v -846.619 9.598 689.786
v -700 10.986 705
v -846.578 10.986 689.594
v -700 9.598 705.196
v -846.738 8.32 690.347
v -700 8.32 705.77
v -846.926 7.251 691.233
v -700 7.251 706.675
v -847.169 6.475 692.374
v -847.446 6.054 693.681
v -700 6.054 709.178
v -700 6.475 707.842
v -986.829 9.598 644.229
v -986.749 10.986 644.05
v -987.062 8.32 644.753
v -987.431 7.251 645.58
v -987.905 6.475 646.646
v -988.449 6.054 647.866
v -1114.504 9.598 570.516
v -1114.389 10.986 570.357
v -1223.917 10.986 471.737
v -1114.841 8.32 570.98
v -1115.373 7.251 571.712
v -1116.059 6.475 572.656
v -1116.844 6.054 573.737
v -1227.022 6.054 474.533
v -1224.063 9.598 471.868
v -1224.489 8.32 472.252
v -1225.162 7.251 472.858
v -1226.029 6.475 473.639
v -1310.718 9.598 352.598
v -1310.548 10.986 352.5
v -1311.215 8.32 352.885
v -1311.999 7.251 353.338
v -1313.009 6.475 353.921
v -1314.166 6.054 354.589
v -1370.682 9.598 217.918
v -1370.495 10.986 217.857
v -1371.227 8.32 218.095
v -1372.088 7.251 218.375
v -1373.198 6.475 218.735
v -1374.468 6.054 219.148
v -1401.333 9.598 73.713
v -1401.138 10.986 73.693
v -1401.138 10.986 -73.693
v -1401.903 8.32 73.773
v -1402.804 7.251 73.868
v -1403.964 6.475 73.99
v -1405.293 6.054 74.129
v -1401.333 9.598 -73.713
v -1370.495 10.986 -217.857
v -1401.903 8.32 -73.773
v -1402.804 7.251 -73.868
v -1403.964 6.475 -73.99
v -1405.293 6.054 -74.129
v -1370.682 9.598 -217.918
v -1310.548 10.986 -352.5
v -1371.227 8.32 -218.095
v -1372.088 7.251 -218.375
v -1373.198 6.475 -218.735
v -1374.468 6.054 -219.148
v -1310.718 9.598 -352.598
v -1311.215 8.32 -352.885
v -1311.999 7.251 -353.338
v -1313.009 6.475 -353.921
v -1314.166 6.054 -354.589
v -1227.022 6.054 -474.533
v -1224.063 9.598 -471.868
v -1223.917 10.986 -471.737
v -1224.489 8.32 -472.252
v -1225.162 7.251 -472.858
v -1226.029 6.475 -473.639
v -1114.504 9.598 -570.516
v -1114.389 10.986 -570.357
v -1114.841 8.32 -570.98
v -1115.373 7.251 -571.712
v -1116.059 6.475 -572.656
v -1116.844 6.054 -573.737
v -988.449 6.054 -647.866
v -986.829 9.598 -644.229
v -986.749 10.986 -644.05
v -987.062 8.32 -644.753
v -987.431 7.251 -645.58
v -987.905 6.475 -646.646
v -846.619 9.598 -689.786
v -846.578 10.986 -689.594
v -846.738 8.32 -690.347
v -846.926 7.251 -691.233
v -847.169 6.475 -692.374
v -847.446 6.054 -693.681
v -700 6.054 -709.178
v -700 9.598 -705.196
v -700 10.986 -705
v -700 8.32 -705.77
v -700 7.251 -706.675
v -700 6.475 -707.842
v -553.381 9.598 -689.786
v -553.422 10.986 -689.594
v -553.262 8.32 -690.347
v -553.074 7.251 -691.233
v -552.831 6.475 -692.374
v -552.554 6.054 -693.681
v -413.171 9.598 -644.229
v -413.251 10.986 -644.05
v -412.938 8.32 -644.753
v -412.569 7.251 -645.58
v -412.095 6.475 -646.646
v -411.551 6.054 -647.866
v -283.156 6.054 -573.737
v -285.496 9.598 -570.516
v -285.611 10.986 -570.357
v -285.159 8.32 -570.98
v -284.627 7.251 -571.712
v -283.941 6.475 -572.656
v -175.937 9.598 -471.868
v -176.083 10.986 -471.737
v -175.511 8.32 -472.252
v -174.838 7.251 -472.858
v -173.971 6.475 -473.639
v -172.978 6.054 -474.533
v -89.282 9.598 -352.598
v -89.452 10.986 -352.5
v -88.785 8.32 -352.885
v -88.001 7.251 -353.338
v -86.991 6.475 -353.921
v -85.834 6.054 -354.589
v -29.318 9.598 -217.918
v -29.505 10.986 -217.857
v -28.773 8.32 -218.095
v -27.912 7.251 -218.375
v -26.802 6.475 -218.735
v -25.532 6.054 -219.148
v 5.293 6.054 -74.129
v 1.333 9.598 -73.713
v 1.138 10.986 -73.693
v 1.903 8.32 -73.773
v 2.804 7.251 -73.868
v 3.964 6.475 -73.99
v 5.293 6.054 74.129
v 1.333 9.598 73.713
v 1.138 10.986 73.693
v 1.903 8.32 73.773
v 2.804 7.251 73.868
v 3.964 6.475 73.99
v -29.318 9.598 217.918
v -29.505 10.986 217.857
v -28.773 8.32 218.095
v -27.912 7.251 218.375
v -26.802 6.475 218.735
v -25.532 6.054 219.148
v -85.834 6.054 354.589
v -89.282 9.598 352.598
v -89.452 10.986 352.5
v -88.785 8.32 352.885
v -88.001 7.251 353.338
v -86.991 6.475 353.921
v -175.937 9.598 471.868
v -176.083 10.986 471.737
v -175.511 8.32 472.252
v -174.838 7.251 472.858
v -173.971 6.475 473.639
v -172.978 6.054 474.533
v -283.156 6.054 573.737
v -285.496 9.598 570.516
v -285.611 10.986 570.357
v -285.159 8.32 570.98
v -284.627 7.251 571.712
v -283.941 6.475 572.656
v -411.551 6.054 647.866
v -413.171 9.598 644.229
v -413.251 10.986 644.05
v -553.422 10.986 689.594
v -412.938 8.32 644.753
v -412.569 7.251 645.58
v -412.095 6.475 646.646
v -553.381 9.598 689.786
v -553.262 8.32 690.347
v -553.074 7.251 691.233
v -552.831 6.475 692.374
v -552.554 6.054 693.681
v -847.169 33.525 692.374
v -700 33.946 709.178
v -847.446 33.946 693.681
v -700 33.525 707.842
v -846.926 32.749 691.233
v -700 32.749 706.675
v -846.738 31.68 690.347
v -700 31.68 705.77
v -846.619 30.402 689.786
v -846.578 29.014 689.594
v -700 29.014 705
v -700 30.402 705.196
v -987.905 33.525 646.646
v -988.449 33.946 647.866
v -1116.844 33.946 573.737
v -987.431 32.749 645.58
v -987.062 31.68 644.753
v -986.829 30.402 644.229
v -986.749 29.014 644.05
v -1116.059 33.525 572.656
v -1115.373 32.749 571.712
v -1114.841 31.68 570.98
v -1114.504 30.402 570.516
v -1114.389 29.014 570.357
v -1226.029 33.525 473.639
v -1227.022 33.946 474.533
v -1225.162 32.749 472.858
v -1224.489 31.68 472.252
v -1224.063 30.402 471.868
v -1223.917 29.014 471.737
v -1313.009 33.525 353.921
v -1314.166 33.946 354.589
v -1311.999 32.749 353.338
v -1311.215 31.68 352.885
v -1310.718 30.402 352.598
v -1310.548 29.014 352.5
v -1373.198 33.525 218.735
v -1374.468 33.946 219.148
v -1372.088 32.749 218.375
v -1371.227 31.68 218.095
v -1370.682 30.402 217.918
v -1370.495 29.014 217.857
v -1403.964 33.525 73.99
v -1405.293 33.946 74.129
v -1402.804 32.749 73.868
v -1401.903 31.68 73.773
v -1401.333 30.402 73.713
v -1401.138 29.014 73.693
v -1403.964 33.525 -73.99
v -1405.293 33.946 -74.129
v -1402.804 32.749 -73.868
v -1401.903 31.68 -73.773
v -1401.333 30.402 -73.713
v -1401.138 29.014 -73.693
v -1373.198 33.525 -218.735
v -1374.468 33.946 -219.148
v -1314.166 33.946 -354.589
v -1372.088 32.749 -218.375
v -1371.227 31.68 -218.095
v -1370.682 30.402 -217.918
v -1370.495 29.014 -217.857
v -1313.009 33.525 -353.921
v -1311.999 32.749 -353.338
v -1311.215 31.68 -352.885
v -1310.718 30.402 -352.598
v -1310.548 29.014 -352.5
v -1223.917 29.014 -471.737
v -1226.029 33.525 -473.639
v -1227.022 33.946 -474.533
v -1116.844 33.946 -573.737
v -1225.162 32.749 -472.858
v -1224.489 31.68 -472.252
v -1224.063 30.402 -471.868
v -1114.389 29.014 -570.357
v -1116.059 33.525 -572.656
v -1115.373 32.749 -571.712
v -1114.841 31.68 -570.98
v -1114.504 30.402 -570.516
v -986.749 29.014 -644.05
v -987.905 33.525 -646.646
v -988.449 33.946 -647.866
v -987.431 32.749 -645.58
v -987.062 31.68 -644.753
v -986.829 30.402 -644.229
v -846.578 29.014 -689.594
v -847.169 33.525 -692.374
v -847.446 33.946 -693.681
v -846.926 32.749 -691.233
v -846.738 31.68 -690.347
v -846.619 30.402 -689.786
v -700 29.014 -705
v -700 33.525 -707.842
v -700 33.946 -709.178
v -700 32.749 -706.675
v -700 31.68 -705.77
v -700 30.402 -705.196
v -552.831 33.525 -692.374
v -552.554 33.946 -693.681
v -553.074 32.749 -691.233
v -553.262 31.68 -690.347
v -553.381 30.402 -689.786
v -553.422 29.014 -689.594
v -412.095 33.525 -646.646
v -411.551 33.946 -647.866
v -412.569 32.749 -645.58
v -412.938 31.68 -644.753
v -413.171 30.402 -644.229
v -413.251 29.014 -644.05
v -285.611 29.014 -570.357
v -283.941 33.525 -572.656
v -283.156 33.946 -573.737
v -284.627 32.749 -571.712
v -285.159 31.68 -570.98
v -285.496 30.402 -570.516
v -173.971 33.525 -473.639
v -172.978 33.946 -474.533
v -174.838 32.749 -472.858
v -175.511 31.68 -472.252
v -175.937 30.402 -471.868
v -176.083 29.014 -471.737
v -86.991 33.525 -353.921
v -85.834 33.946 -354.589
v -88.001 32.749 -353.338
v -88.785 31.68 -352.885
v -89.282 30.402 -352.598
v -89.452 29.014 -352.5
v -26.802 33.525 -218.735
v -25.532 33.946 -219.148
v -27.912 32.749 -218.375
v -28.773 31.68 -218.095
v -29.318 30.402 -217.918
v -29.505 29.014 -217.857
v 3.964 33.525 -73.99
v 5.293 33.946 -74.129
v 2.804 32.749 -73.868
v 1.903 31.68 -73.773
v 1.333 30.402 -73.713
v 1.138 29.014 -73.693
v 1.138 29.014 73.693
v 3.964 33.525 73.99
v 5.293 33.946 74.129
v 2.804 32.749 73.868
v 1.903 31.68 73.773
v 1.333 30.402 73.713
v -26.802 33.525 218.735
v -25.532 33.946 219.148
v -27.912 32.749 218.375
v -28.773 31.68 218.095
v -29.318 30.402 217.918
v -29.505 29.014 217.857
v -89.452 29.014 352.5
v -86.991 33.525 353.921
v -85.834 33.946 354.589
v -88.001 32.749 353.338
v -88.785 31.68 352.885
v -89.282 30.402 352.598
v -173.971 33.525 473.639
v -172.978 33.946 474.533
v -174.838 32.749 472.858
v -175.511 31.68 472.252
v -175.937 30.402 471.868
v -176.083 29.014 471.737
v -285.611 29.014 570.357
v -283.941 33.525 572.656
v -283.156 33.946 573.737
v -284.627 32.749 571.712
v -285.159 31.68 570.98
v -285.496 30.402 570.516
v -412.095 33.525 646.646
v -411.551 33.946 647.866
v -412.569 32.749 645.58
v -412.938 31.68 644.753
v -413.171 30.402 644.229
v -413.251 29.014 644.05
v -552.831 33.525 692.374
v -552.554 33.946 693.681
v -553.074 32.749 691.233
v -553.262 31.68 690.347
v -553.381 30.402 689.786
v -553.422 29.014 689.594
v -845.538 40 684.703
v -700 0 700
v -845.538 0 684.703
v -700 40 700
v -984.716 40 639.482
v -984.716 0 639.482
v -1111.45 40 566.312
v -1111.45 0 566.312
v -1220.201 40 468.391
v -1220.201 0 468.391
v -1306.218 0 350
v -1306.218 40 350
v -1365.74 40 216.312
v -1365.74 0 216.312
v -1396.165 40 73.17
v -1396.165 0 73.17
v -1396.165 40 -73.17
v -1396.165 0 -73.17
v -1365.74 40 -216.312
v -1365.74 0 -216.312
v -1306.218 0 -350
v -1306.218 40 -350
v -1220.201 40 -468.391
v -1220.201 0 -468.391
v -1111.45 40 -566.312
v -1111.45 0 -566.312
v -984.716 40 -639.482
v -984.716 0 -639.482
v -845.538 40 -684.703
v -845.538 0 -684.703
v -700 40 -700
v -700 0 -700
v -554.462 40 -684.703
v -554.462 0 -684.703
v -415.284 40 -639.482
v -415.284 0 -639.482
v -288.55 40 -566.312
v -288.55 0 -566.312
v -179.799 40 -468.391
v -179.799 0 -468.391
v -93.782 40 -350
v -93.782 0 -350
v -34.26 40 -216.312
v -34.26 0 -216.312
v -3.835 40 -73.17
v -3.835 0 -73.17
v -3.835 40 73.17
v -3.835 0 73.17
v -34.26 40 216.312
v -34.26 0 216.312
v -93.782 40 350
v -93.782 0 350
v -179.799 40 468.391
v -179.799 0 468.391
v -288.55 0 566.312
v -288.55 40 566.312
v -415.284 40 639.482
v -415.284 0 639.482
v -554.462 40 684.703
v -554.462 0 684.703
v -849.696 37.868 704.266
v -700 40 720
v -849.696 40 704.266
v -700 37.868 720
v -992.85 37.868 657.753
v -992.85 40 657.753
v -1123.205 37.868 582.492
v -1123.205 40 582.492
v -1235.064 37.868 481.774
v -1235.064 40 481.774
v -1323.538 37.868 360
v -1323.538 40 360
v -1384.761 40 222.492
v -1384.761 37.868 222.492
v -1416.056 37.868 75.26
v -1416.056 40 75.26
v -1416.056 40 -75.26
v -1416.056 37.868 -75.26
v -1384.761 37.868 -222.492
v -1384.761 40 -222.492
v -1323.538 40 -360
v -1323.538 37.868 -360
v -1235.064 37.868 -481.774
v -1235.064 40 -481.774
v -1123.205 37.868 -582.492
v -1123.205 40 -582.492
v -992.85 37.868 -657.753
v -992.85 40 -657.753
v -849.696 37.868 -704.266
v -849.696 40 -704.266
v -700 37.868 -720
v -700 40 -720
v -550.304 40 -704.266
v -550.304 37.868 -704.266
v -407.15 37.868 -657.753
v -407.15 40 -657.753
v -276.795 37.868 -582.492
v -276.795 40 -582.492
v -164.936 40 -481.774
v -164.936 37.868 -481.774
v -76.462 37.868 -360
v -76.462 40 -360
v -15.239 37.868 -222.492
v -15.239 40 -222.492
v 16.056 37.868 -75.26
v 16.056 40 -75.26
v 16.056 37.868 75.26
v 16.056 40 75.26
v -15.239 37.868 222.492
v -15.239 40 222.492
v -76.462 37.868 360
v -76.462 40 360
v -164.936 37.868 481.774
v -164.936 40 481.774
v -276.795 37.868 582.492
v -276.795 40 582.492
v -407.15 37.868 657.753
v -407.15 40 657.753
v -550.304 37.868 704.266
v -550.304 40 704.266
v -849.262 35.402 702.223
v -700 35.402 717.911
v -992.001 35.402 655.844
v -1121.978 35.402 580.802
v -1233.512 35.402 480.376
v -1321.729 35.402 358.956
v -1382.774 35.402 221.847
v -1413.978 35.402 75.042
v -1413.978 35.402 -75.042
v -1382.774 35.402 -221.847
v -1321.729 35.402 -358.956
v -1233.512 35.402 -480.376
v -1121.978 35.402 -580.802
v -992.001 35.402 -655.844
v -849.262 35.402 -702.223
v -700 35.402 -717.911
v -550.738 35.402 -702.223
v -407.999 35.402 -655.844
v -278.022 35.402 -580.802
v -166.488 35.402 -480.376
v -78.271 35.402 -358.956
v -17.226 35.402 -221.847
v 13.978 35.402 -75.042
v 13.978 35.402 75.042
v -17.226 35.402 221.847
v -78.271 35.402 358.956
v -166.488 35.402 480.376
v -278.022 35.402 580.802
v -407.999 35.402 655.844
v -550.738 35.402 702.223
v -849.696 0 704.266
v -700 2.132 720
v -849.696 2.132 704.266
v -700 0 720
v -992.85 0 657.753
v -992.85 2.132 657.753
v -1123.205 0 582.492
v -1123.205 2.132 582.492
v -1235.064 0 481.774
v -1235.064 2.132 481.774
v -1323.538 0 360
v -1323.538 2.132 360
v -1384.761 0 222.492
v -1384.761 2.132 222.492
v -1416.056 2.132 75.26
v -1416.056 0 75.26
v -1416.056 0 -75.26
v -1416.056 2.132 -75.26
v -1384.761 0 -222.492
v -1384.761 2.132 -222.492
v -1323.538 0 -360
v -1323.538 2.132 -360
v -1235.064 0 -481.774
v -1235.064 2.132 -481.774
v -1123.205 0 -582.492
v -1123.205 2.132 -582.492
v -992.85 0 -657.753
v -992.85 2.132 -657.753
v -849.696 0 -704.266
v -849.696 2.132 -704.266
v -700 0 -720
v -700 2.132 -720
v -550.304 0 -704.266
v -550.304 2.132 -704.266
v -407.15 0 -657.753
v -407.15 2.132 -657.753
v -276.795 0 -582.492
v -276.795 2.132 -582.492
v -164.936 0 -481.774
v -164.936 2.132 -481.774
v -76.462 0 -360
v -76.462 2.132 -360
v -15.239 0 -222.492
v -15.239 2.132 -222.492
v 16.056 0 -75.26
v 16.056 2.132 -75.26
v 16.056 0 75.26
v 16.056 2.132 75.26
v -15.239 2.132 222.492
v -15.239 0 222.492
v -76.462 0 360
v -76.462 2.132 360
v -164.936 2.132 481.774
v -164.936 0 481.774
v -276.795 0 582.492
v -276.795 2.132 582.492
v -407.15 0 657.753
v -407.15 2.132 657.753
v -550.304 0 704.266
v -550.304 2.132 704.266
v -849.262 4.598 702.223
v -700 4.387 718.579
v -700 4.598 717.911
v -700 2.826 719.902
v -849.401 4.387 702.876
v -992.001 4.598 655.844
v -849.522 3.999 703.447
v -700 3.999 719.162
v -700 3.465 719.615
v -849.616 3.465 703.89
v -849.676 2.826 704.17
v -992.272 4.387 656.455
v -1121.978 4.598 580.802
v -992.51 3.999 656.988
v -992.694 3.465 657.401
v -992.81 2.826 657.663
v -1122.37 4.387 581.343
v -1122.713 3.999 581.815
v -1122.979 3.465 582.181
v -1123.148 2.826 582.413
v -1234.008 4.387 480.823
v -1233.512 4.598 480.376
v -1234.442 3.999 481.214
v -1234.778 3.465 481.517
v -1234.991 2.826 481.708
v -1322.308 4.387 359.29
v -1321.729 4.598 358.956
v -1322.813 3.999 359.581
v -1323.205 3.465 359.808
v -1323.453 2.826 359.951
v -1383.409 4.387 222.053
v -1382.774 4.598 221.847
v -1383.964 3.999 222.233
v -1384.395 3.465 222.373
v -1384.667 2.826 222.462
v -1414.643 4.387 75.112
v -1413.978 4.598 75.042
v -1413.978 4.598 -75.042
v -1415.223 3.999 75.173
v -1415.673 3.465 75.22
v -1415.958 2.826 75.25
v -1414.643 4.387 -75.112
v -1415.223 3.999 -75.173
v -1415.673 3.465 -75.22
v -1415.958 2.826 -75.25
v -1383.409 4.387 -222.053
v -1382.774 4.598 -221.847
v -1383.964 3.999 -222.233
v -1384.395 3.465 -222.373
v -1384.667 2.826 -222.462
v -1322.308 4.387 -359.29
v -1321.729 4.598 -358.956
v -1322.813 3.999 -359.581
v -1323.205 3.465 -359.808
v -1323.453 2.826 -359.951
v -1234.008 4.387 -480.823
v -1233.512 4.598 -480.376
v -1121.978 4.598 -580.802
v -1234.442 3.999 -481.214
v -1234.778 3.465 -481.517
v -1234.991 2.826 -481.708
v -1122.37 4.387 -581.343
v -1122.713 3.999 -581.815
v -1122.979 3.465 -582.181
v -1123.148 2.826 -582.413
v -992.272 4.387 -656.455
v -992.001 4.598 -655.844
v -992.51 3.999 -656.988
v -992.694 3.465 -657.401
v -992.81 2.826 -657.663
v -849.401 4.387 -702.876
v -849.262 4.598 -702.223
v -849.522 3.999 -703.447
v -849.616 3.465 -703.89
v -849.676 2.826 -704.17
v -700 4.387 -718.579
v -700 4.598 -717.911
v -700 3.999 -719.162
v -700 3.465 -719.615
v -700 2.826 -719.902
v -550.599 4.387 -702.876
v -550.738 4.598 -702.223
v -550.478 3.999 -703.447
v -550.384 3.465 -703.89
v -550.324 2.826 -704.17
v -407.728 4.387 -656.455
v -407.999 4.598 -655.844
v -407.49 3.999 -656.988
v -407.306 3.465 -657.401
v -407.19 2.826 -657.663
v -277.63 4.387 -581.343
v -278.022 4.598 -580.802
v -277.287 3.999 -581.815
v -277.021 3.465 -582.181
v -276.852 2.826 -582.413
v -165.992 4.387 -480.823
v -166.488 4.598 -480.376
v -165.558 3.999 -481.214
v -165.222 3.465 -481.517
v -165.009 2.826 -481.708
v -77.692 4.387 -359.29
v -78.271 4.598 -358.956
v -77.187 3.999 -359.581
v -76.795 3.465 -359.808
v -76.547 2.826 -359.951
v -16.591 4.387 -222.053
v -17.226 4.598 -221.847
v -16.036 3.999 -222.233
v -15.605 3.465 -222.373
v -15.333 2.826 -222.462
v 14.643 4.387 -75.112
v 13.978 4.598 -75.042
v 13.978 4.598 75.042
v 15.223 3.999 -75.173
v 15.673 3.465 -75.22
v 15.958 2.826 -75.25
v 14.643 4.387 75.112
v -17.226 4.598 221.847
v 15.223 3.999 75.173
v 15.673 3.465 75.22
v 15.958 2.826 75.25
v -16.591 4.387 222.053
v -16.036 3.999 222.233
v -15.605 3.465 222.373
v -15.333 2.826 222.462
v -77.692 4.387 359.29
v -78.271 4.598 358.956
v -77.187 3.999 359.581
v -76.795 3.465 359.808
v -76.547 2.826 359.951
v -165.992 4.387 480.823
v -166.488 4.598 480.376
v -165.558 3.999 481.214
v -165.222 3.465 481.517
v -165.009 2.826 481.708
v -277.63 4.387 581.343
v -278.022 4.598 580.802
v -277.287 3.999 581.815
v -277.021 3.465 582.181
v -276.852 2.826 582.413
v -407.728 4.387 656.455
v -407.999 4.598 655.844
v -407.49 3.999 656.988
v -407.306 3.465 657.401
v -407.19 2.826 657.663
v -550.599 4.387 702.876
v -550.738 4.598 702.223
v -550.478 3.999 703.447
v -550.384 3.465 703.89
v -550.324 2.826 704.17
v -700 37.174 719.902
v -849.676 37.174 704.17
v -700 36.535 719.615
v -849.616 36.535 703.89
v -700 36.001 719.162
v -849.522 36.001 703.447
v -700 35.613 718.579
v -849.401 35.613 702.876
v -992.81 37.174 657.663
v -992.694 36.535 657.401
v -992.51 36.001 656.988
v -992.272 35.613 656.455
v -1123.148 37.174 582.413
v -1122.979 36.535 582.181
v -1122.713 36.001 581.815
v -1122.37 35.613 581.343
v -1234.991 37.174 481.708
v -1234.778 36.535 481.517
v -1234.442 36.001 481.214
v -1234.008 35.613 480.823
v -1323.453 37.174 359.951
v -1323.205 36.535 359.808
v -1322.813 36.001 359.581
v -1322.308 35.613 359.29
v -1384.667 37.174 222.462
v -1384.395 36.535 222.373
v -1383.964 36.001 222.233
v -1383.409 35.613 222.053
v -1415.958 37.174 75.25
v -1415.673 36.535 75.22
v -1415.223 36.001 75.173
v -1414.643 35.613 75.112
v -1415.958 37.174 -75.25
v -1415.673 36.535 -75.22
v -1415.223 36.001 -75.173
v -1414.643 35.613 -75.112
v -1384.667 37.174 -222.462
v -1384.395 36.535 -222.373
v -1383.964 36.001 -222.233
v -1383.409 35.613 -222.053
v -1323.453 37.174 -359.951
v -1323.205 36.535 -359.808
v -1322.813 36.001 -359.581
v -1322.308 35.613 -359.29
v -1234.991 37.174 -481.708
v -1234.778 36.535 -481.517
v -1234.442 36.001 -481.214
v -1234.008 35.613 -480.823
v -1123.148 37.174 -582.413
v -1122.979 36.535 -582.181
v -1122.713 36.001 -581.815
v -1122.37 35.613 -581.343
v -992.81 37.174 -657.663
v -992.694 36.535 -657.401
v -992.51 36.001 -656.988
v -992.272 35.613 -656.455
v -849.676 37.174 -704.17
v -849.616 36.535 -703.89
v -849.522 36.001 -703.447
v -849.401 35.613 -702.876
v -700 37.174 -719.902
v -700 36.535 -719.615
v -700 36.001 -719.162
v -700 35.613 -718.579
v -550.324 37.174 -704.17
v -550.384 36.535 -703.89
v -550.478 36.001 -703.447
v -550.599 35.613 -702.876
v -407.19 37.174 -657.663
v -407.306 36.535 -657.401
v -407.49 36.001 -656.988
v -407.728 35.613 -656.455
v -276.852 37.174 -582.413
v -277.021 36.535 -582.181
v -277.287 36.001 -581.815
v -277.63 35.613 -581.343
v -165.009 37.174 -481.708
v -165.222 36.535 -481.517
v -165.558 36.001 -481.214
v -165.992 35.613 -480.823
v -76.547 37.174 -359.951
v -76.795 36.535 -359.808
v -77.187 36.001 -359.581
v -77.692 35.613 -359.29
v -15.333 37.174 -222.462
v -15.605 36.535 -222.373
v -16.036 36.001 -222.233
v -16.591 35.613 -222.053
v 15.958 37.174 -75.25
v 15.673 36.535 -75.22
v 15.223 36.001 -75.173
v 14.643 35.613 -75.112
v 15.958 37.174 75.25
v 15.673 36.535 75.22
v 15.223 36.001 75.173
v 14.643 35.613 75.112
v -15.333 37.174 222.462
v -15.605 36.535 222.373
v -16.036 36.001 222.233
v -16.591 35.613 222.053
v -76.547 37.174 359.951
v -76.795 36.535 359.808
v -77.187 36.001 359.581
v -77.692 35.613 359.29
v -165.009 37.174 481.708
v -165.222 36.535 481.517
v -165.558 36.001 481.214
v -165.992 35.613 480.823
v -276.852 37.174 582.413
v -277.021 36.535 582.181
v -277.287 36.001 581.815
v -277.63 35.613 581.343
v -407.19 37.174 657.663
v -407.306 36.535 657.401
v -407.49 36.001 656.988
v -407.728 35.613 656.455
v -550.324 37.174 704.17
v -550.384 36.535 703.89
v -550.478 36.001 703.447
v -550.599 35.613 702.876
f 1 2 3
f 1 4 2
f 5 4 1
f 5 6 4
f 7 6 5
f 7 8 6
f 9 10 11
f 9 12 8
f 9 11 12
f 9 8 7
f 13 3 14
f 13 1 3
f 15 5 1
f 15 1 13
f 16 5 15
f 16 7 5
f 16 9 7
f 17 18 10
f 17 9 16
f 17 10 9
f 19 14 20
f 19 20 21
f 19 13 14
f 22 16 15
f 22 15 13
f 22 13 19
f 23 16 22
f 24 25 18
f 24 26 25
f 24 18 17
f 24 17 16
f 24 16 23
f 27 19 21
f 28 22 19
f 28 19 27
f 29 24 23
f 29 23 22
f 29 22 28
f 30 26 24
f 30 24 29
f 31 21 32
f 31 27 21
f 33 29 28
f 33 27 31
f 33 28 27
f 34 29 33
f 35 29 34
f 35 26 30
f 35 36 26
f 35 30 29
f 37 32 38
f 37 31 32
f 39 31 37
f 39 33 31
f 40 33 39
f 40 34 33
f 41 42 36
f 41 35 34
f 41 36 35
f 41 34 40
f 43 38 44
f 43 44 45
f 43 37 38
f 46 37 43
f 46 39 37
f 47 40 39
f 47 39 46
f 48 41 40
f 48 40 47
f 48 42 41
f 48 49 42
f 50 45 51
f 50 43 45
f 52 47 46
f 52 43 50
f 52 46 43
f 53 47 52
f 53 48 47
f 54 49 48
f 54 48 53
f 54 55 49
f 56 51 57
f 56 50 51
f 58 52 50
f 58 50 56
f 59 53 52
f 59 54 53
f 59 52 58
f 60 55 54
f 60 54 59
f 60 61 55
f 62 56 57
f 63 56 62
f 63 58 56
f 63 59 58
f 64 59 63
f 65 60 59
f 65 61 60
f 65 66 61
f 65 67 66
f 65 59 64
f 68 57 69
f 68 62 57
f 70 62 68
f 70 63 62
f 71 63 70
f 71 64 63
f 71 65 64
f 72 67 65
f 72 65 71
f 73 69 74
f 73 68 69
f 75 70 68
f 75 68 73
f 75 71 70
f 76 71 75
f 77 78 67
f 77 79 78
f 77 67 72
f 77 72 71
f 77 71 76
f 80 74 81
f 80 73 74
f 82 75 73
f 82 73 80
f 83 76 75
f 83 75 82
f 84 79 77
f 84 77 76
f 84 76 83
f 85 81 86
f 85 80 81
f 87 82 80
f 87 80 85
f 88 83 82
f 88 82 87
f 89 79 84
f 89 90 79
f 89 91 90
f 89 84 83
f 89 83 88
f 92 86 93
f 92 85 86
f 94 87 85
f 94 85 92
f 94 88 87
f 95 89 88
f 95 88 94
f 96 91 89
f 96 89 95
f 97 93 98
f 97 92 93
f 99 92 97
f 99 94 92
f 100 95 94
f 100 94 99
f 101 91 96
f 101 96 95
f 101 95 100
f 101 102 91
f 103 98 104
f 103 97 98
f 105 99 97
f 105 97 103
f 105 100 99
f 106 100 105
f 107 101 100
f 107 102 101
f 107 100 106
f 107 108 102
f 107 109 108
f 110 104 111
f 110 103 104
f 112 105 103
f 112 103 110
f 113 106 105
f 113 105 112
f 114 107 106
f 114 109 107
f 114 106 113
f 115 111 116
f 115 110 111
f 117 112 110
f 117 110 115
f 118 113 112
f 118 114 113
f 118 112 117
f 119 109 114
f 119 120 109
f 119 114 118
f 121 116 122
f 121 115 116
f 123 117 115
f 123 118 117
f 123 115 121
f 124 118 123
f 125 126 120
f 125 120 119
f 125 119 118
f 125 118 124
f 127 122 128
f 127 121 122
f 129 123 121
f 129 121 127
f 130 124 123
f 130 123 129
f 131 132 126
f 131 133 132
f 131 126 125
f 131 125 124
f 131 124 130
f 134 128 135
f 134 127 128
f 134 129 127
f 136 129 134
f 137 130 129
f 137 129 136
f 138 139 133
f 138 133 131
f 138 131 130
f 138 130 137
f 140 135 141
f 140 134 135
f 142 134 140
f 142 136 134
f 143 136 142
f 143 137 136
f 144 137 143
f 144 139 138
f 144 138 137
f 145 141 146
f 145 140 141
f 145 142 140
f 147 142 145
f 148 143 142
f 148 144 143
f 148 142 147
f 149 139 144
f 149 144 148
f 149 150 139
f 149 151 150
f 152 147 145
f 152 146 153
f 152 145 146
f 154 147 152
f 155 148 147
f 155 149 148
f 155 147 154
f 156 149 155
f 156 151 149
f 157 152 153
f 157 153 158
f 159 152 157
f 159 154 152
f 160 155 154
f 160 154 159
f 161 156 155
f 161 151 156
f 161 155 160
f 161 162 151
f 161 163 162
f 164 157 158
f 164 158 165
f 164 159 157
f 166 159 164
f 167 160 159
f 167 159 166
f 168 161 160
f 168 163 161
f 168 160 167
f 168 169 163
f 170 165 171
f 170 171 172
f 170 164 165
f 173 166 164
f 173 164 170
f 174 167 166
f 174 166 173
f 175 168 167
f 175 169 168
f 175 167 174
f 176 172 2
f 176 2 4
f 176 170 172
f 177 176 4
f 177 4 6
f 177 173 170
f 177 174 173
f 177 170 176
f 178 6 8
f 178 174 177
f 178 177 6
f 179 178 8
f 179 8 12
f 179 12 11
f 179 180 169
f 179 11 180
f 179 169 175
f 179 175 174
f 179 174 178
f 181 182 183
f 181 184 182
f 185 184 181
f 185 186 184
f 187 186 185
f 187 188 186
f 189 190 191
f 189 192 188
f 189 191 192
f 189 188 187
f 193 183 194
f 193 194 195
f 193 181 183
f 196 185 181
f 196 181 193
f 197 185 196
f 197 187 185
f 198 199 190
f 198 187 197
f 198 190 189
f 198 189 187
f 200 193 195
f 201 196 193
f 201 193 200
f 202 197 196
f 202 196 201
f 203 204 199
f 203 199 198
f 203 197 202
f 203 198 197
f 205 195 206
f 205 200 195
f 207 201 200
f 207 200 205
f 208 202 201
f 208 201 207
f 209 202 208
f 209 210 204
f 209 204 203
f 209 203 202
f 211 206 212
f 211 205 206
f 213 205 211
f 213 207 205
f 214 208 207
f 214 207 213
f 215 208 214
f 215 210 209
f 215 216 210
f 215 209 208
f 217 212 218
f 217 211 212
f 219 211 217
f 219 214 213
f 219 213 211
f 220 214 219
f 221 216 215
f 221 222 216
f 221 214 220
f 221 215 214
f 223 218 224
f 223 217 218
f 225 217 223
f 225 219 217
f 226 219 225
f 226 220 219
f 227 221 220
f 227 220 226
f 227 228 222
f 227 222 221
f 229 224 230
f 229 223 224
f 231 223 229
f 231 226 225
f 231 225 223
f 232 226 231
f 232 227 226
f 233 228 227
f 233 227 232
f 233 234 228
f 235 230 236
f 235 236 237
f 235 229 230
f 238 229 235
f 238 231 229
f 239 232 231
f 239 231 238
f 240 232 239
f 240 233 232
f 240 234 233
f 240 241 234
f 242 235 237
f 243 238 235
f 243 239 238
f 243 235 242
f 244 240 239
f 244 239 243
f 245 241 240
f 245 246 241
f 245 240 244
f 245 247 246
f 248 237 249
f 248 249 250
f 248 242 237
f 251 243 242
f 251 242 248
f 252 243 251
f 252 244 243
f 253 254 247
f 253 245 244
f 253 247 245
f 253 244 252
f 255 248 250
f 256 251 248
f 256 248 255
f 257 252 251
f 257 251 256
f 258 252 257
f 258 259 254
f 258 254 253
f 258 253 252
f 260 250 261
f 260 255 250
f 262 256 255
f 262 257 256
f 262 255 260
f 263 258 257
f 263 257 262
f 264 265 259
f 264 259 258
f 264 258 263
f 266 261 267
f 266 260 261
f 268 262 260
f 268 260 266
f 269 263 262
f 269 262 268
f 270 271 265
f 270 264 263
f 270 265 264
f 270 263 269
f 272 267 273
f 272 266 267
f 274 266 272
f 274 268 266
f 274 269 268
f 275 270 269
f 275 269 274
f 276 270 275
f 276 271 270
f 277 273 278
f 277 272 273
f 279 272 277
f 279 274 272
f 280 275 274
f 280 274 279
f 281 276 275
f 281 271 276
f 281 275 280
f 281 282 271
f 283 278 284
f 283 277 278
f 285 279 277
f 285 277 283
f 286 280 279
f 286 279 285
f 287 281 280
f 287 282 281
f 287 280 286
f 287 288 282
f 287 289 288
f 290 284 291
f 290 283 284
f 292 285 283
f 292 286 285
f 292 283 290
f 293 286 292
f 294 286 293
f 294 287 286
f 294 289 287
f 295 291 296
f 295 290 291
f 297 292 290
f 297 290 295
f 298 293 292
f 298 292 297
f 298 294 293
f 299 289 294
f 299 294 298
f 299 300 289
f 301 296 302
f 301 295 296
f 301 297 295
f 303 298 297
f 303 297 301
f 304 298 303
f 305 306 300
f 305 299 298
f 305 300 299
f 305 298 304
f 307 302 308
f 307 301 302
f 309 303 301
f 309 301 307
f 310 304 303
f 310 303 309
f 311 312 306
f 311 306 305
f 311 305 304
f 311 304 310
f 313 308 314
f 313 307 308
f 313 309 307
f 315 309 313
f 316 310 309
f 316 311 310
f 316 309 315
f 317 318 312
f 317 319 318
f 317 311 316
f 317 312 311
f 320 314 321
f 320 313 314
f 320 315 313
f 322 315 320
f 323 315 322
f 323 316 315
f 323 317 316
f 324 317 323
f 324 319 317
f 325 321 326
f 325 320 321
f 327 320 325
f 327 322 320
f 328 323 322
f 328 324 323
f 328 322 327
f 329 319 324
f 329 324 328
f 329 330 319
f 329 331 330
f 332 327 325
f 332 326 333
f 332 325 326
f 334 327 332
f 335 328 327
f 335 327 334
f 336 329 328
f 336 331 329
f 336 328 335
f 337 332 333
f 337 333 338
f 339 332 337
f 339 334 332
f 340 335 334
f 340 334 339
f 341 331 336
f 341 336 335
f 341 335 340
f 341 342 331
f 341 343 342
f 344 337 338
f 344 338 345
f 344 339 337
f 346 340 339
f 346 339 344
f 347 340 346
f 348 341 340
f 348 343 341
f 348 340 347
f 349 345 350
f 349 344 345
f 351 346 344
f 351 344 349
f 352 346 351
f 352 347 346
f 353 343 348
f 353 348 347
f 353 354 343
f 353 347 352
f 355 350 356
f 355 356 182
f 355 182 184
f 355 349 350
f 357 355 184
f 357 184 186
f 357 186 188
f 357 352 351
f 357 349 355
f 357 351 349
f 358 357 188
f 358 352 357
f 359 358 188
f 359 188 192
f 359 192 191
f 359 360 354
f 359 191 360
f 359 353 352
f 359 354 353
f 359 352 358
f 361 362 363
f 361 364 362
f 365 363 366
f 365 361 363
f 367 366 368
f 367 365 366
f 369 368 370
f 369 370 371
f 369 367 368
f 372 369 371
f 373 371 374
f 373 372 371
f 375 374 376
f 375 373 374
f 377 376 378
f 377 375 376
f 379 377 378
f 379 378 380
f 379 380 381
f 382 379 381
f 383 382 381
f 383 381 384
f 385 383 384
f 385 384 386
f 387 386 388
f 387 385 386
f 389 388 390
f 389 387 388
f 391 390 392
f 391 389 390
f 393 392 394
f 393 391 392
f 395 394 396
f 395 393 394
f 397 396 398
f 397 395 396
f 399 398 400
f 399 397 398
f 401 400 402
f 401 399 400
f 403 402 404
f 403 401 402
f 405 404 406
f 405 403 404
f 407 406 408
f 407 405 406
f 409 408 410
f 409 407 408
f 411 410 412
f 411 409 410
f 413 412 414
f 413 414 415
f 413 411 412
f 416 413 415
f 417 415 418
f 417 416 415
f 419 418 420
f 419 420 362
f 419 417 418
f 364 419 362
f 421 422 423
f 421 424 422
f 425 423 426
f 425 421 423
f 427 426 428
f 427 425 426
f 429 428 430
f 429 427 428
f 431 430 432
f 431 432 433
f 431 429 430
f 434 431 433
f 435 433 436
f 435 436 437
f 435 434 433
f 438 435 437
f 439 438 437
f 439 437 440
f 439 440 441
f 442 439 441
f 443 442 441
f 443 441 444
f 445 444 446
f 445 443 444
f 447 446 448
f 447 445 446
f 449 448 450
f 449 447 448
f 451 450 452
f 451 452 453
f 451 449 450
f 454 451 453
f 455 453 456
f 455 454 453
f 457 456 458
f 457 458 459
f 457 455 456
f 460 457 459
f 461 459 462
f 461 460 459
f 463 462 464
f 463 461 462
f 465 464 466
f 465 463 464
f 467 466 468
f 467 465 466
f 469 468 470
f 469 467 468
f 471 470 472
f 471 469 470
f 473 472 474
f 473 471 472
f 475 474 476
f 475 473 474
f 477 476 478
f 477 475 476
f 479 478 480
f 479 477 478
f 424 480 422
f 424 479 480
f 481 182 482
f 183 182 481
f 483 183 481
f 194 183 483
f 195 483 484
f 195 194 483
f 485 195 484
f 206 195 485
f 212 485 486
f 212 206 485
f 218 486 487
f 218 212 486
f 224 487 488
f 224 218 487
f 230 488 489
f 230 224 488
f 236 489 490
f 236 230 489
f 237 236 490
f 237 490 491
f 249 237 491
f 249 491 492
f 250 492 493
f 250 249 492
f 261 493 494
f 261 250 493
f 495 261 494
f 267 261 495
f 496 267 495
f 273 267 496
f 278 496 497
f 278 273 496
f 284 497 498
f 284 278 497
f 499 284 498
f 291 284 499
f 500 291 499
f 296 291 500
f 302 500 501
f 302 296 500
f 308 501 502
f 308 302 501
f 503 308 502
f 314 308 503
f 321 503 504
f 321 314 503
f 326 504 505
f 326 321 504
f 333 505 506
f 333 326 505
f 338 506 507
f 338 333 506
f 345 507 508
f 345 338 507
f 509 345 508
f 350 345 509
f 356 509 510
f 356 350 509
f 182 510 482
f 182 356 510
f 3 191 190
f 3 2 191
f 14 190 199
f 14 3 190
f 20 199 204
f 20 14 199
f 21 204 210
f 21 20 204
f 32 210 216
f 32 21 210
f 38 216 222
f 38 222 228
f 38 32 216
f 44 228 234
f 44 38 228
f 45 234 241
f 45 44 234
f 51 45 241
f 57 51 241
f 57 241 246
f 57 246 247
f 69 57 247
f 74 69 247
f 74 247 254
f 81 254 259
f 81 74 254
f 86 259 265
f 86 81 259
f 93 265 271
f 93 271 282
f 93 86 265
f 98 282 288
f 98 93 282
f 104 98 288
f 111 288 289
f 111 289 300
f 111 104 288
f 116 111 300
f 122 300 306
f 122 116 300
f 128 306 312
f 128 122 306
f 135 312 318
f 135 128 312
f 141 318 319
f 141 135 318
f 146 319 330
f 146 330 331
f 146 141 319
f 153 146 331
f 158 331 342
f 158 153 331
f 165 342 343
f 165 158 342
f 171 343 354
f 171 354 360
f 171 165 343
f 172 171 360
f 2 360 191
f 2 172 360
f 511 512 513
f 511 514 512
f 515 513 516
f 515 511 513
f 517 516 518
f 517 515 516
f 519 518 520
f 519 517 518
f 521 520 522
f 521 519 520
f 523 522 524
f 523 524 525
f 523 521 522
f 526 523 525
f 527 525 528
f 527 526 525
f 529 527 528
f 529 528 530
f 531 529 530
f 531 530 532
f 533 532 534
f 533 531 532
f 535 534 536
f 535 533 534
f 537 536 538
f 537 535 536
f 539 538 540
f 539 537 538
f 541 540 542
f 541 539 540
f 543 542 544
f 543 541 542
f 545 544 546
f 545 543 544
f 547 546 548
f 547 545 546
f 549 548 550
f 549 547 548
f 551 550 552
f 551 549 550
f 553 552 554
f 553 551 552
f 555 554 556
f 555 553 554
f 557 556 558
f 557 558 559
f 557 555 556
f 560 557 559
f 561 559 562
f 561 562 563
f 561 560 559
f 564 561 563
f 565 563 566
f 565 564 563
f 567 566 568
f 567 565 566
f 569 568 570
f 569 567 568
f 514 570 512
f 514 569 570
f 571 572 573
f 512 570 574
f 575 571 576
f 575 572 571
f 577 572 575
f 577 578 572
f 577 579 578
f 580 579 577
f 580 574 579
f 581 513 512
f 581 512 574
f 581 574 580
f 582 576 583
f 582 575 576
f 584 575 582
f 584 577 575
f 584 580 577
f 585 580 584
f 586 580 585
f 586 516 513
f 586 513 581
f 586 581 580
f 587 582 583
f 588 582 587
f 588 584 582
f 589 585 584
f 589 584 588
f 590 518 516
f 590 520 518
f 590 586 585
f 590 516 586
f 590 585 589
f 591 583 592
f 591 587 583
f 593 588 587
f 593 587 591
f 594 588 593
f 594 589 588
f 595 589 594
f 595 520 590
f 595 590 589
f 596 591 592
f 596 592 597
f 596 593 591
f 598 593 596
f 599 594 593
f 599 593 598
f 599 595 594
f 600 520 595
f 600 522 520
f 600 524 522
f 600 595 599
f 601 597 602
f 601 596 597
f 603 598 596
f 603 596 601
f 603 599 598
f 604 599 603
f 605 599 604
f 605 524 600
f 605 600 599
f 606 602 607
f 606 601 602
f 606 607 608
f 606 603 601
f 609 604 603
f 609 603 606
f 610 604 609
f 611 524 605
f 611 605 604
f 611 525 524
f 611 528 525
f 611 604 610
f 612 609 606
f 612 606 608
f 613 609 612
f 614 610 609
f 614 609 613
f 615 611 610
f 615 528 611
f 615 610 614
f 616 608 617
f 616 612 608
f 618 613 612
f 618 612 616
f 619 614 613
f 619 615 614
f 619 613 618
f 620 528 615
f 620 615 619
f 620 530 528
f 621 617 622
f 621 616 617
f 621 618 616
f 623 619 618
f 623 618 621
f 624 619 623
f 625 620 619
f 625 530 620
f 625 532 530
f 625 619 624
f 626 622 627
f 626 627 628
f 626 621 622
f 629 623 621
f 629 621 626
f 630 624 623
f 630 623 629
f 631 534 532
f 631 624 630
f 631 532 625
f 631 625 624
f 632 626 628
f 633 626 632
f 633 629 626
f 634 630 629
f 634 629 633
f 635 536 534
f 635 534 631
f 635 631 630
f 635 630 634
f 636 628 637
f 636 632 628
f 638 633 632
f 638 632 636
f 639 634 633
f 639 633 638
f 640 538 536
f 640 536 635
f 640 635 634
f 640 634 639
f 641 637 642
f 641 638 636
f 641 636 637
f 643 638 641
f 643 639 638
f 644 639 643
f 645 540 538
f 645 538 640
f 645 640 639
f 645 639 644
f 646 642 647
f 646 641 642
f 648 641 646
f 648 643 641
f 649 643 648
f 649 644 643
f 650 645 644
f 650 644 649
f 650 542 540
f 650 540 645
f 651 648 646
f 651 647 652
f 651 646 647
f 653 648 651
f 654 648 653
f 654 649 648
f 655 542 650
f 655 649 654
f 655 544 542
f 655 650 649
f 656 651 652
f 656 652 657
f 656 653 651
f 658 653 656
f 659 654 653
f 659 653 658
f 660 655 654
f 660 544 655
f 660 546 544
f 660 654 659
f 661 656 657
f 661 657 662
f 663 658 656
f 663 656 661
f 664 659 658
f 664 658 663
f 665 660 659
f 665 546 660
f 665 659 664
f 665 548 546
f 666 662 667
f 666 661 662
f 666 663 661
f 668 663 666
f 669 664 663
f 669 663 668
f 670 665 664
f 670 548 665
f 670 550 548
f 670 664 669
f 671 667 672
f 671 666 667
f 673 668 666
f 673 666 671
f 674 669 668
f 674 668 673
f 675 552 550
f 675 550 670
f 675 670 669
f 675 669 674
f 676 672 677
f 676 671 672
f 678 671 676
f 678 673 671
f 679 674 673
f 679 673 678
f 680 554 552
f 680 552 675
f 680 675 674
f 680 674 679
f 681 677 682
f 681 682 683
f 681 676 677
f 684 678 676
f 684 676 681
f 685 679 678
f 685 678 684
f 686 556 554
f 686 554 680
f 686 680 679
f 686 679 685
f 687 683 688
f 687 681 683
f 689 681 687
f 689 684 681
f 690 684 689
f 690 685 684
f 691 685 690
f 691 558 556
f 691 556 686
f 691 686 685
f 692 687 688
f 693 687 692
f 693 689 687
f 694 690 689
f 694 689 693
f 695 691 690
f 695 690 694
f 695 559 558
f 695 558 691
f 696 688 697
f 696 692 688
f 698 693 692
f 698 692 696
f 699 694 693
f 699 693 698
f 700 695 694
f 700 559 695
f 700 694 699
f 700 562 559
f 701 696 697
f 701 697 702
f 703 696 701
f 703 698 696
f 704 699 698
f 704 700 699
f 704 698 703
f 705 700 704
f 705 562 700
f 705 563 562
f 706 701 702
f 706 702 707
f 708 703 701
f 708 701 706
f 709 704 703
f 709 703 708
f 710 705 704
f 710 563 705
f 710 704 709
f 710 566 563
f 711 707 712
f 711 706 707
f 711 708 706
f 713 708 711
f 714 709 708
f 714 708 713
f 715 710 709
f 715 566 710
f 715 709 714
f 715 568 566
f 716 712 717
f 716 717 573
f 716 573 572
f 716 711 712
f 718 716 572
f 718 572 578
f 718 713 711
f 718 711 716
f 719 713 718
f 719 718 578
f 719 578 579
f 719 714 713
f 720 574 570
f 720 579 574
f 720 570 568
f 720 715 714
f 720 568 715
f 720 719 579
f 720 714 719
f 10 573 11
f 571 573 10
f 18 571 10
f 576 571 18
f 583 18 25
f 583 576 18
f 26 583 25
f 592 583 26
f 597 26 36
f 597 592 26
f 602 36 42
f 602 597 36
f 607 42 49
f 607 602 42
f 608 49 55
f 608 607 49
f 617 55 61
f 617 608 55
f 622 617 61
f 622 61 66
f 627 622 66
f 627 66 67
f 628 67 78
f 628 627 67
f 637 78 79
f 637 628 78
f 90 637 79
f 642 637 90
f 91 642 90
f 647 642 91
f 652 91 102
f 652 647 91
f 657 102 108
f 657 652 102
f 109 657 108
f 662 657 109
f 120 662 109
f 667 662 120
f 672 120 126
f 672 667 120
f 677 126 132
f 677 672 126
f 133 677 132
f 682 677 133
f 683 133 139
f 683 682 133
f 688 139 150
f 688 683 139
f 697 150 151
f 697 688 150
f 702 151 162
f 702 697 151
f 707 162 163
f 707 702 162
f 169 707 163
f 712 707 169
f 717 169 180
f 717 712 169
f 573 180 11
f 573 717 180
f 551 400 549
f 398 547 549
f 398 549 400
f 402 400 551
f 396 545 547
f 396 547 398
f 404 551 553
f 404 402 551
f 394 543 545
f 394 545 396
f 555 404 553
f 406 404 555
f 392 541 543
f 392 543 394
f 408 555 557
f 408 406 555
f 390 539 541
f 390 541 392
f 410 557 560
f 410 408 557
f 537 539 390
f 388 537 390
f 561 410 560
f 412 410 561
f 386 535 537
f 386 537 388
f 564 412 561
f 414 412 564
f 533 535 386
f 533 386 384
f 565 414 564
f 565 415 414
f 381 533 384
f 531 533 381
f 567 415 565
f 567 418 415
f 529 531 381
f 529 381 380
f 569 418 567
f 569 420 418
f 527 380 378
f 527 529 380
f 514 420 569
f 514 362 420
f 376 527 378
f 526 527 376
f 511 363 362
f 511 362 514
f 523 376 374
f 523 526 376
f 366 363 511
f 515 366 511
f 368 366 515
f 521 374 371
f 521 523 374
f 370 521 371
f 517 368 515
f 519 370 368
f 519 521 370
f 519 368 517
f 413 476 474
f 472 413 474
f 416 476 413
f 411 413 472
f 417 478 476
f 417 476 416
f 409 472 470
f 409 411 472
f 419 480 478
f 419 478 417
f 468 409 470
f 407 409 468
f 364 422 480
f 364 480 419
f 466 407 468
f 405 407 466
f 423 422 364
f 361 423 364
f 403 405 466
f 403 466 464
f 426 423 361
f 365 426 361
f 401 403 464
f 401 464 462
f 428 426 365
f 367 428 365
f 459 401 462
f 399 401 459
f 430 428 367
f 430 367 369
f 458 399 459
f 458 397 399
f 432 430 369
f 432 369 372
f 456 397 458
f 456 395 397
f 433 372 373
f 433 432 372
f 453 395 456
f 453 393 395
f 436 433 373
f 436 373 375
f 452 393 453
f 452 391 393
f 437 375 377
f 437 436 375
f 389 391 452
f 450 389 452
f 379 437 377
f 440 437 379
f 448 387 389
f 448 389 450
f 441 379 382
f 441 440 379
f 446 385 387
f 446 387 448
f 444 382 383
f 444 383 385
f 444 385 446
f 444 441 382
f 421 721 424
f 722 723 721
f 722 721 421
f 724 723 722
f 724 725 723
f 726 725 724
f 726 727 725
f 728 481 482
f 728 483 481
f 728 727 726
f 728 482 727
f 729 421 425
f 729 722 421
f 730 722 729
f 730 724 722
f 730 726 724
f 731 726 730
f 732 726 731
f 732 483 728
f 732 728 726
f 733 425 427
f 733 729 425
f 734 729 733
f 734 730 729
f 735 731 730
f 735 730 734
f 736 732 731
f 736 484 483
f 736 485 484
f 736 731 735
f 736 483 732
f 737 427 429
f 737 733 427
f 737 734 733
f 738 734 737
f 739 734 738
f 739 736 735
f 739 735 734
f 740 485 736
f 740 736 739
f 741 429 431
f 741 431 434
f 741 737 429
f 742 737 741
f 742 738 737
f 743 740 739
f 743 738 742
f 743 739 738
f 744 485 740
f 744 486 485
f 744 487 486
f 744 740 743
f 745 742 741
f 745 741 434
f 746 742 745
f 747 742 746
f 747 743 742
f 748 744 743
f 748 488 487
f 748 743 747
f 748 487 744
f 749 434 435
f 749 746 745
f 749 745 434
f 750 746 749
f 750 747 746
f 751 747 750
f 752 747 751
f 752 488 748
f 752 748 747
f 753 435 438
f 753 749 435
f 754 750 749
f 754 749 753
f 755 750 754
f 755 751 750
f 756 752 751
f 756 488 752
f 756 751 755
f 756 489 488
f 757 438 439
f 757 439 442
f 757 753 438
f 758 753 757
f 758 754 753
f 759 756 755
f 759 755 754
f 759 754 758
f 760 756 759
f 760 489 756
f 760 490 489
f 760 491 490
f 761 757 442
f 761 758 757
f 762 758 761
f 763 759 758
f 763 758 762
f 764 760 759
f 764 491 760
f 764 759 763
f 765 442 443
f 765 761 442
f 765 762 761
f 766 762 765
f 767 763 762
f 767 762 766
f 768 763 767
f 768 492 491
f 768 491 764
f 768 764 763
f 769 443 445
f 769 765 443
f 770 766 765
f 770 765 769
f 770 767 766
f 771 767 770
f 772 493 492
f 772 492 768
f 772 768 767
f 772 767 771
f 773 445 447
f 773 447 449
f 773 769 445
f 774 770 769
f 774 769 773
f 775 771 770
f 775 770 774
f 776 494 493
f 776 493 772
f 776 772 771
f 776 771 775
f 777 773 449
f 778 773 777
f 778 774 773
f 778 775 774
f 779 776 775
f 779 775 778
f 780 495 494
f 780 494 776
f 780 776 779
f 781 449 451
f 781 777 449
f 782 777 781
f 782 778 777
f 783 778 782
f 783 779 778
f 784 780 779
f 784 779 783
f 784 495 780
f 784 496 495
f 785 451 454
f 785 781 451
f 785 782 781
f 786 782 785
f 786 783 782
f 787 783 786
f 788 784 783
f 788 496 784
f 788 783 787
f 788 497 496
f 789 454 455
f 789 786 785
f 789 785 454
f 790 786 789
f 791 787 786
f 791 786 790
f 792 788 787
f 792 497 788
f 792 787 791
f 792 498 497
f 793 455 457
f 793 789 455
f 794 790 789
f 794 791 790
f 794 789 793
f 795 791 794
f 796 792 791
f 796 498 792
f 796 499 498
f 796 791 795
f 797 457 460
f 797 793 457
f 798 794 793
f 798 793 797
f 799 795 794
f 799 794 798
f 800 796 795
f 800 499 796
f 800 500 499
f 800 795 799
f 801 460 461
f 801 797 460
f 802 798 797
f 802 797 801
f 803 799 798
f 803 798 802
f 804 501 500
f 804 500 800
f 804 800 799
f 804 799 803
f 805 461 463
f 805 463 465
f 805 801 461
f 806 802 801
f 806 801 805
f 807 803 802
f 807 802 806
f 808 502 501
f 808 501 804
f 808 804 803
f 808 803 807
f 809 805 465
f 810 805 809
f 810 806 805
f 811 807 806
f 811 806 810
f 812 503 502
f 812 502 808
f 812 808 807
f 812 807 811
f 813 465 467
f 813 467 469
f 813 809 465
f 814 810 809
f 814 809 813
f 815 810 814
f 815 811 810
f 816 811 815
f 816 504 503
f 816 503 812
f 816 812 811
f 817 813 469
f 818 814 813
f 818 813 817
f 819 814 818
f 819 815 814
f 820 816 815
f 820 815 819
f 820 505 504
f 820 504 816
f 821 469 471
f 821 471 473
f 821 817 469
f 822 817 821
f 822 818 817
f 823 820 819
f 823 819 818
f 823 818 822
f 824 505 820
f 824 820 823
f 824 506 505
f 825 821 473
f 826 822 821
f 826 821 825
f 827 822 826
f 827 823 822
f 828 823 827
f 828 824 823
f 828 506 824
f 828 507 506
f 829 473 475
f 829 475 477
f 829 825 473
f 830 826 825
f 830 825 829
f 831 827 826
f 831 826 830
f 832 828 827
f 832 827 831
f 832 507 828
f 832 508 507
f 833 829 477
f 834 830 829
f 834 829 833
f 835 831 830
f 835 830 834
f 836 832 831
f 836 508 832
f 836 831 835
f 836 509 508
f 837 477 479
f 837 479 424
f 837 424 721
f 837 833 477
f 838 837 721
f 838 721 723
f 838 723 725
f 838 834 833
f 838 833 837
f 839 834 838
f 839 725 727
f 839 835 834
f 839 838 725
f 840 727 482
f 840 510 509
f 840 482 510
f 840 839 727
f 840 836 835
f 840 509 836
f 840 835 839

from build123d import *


with BuildPart() as part:
    # Sketch1 → Revolve1 (revolve)
    with BuildSketch(Plane.XY, mode=Mode.PRIVATE) as revolve1_sk:
        with BuildLine():
            Line((0, 0), (0, 40))
            Line((0, 40), (20, 40))
            Line((20, 40), (20, 37.86788351))
            ThreePointArc((20, 37.86788351), (19.407559514, 36.251957552), (17.91102664, 35.401903562))
            Line((17.91102664, 35.401903562), (9.17794672, 33.946284063))
            ThreePointArc((9.17794672, 33.946284063), (6.184880972, 32.246176083), (5, 29.014324168))
            Line((5, 29.014324168), (5, 10.985675832))
            ThreePointArc((5, 10.985675832), (6.184880972, 7.753823917), (9.17794672, 6.053715937))
            Line((9.17794672, 6.053715937), (17.91102664, 4.598096438))
            ThreePointArc((17.91102664, 4.598096438), (19.407559514, 3.748042448), (20, 2.13211649))
            Line((20, 2.13211649), (20, 0))
            Line((20, 0), (0, 0))
        make_face()
    revolve(revolve1_sk.sketch.rotate(Axis((-700, 40, 0), (0, -1, 0)), 90), axis=Axis((-700, 40, 0), (0, -1, 0)))


solid = part.part
